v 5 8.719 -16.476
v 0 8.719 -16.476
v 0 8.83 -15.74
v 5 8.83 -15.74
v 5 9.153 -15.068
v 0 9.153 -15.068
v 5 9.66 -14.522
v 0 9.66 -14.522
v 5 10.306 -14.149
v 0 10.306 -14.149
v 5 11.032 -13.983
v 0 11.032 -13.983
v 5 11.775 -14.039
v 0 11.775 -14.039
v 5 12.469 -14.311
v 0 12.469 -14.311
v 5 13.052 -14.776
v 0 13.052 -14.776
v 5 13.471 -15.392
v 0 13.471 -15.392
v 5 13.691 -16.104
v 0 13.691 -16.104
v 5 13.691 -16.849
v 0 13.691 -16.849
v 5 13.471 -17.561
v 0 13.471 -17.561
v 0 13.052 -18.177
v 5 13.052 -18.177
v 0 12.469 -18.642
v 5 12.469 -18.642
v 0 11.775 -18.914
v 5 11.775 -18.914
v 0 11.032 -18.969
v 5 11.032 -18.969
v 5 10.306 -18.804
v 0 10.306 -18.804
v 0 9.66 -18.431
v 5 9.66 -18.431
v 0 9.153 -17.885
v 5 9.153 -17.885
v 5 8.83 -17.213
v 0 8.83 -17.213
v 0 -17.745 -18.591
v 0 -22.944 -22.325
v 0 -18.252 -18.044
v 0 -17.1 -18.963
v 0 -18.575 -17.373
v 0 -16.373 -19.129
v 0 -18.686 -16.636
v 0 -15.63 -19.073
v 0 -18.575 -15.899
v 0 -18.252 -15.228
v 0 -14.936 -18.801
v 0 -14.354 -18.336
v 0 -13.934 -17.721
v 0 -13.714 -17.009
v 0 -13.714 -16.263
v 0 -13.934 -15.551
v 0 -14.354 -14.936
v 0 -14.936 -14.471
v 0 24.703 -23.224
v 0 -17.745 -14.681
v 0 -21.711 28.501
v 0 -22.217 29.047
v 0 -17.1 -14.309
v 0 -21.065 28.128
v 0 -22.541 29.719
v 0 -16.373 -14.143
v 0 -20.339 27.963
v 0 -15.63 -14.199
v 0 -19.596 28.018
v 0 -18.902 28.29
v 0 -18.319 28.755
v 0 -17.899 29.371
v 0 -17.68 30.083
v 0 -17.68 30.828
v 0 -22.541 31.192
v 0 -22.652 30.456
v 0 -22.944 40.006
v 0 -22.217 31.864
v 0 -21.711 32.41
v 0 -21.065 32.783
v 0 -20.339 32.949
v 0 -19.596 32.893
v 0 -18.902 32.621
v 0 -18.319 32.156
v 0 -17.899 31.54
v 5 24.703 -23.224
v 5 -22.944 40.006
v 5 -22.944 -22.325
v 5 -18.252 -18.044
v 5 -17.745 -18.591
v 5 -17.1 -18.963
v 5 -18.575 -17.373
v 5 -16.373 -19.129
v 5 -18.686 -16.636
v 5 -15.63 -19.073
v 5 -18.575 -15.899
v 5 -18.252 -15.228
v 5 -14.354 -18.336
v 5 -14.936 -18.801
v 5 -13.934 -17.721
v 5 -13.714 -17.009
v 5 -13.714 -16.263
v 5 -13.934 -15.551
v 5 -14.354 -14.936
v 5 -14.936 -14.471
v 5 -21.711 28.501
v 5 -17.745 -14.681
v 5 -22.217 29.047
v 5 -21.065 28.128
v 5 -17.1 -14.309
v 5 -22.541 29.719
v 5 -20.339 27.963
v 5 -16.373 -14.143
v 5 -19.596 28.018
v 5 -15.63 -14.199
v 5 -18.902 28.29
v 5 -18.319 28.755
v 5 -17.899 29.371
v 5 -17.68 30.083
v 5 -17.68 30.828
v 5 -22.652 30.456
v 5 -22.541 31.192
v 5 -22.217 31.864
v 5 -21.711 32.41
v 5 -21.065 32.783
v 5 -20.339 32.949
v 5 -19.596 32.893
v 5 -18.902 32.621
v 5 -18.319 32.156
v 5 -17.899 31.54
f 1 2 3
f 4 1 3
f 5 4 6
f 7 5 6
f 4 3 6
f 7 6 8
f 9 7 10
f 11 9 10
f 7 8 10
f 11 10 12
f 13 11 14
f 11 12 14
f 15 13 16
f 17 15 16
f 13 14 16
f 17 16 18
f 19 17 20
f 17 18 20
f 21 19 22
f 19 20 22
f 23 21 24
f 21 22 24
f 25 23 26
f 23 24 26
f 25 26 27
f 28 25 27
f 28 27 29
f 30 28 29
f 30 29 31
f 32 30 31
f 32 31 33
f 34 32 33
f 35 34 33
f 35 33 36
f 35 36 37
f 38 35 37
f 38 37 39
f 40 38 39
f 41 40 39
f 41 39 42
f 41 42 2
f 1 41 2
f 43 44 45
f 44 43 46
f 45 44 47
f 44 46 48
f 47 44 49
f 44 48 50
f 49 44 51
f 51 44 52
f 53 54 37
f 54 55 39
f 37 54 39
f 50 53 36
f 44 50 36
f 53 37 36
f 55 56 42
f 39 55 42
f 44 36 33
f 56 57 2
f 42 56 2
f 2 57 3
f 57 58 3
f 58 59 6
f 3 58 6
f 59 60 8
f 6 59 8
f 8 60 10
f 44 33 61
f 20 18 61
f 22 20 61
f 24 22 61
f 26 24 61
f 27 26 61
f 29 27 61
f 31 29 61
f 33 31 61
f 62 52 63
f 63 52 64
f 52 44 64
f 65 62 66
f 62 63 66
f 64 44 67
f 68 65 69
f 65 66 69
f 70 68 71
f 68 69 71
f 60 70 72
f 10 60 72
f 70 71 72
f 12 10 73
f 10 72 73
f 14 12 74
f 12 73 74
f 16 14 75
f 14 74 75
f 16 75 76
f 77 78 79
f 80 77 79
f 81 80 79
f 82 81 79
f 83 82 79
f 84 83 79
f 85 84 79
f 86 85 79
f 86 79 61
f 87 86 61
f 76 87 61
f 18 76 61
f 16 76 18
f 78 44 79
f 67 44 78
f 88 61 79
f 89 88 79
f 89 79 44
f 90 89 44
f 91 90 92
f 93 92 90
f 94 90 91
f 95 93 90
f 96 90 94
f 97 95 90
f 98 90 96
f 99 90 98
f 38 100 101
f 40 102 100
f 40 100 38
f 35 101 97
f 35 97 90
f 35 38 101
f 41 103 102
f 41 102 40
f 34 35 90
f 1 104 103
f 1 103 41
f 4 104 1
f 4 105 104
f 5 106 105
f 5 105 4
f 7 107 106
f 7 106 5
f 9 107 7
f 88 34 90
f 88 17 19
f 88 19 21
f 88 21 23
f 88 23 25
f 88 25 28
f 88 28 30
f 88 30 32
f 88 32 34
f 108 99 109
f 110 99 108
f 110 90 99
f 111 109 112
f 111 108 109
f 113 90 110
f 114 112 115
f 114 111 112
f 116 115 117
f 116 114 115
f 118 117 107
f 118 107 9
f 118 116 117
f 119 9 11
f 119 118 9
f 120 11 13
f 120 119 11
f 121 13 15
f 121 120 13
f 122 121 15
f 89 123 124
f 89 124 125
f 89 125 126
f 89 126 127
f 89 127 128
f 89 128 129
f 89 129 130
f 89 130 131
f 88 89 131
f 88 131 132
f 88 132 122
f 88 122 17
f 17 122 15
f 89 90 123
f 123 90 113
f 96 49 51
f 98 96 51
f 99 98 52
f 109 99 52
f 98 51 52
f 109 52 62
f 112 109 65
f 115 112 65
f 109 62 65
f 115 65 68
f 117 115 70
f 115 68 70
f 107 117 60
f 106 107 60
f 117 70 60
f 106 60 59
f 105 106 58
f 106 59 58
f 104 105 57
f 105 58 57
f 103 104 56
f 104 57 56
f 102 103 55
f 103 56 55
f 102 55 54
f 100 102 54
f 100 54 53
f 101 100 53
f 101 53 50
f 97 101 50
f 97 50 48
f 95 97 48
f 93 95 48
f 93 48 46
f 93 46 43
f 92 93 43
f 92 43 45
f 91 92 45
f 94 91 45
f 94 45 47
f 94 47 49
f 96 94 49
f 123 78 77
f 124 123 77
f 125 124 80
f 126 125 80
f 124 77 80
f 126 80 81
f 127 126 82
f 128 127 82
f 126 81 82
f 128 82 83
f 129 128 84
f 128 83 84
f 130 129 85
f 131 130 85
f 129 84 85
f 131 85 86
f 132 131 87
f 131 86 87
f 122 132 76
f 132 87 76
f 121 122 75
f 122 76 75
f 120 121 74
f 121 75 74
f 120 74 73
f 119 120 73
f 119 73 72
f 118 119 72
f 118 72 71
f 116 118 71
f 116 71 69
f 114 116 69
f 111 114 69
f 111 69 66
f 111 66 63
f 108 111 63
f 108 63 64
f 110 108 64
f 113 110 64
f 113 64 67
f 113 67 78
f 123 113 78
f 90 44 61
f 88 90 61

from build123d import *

# Parameters (mm, degrees)
F1_DEPTH = 5
F3_D     = 5
F5_D     = 5
F7_D     = 5


with BuildPart() as f1:
    # F0 (on Right) → F1 (new body)
    with BuildSketch(Plane.YZ):
        Polygon((24.703234, -23.224443), (-22.944346, 40.005997), (-22.944346, -22.325426), align=None)
    extrude(amount=F1_DEPTH)

    # F3 (through all)
    with Locations(Plane.YZ.offset(5)):
        with Locations((11.219002, -16.476458)):
            Hole(F3_D / 2)

    # F5 (through all)
    with Locations(Plane.YZ.offset(5)):
        with Locations((-16.186237, -16.636005)):
            Hole(F5_D / 2)

    # F7 (through all)
    with Locations(Plane.YZ.offset(5)):
        with Locations((-20.151891, 30.455533)):
            Hole(F7_D / 2)


solid = f1.part
